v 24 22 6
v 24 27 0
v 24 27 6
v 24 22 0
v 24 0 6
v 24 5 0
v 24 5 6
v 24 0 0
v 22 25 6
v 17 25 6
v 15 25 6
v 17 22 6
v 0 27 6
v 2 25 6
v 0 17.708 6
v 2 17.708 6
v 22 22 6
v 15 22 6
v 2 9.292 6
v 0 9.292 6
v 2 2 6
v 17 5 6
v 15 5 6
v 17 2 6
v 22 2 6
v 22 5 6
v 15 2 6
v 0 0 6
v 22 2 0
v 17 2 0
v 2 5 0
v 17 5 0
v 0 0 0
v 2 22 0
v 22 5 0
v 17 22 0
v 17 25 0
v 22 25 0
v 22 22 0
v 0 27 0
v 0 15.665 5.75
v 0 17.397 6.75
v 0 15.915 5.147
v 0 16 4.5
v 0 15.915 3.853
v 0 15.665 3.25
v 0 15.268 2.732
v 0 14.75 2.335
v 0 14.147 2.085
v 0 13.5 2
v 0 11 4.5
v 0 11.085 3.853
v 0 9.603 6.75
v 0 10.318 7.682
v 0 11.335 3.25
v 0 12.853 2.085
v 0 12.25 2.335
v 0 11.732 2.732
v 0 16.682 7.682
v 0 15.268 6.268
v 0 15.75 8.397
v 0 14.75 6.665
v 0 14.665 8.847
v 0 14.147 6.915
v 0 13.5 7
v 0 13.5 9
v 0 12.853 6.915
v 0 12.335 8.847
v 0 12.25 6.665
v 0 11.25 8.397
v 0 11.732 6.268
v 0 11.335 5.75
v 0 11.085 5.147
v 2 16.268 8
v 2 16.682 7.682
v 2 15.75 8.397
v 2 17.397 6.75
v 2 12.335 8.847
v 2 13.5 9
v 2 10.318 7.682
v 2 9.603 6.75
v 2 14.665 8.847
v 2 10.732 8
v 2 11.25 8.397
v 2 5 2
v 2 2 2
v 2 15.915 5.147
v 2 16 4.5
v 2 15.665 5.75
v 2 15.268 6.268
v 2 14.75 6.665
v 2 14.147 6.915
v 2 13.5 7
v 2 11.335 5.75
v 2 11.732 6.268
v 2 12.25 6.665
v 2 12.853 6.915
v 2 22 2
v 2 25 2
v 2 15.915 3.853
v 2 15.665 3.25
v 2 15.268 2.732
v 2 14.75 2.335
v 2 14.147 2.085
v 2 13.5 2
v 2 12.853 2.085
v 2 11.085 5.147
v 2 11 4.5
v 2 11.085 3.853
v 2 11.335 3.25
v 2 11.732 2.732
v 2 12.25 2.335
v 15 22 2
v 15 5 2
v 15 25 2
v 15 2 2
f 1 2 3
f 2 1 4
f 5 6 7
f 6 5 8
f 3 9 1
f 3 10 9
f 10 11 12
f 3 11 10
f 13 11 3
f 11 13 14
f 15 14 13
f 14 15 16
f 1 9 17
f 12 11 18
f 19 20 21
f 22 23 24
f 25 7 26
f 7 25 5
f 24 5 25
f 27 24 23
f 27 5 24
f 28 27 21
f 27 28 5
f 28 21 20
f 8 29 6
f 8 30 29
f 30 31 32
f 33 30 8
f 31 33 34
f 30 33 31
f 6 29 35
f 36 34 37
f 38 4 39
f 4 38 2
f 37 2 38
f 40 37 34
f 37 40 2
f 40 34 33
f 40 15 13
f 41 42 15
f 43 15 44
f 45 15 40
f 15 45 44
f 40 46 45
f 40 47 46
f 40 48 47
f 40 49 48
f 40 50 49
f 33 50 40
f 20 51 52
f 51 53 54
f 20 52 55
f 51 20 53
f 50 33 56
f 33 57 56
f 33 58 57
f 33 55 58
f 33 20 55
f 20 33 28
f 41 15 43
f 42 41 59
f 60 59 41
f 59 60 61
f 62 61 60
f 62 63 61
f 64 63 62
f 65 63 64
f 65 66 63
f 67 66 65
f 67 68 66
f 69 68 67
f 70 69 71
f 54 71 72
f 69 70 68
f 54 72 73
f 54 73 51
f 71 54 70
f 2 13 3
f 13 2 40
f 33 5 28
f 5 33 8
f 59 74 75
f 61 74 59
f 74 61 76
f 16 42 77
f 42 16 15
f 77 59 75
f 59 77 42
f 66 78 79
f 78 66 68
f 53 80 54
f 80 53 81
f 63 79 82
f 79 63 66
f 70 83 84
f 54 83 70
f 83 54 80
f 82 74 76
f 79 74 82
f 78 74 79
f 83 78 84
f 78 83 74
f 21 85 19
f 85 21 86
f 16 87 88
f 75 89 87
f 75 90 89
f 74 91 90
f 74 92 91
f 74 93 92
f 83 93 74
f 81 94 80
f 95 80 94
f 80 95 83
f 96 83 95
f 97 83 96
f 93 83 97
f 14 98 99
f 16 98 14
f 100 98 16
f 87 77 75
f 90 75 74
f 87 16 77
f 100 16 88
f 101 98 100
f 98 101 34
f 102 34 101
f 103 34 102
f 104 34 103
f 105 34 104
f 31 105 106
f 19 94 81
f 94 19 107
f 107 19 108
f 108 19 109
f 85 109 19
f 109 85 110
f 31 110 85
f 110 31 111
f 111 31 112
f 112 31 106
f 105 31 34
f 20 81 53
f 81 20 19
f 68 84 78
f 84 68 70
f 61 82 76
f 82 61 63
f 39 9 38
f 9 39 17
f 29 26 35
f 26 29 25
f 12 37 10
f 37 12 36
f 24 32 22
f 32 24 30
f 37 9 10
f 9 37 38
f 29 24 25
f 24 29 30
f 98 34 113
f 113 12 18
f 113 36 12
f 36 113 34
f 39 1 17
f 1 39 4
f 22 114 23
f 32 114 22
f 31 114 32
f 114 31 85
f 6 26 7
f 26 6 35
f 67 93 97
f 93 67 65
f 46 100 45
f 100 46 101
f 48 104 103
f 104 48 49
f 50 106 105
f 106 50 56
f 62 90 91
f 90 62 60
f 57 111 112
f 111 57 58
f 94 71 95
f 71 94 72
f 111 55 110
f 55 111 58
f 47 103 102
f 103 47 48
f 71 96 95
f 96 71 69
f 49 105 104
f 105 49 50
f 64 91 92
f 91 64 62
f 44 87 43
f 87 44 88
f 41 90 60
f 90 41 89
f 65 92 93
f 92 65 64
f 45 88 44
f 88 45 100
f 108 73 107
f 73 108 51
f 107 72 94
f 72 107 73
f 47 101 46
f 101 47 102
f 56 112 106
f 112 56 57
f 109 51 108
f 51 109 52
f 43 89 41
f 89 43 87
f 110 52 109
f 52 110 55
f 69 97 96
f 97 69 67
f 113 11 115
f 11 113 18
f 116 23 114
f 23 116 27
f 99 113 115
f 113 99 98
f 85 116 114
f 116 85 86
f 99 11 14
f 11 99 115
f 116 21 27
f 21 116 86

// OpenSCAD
// author: clayb.rpi@gmail.com
// date: 2013-01-20
// units: mm
//
// description: A standoff bracket for mounting things to a ceiling.

// The width of the thing you are mounting.
THING_WIDTH = 23;

// The height of the thing you are mounting.
THING_HEIGHT = 5;

// The depth of the fingers grasping the thing you are mounting.
FINGER_DEPTH = 3;

// Distance from the wall the thing should be kept.
STANDOFF_HEIGHT = 15;

// How thick the walls of the bracket should be.
WALL_THICKNESS = 2;

// The printing height of the bracket.
BRACKET_HEIGHT = 6;

// The radius of the screw hole.
MOUNTING_SCREW_RADIUS = 2.5;


module ceilingMountingBracket($fn=24) {
  assign(outer_depth=2 * WALL_THICKNESS + THING_HEIGHT + max(0, STANDOFF_HEIGHT),
         outer_width=THING_WIDTH + 2 * WALL_THICKNESS,
         mounting_screw_height=max(BRACKET_HEIGHT / 2, WALL_THICKNESS + MOUNTING_SCREW_RADIUS)) {
    difference() {
      union() {
        // The rough shape of the bracket.
        cube([outer_depth, outer_width, BRACKET_HEIGHT]);

        // extra support for the mounting screw.
        translate([0, outer_width / 2, mounting_screw_height])
        rotate([0, 90, 0])
        cylinder(r=MOUNTING_SCREW_RADIUS + WALL_THICKNESS, h=WALL_THICKNESS);
      }

      // cut away the spot for the thing being mounted.
      translate([WALL_THICKNESS + max(0, STANDOFF_HEIGHT), WALL_THICKNESS, -1])
      cube([THING_HEIGHT, THING_WIDTH, BRACKET_HEIGHT + 2]);

      // cut away the core of the bracket.
      translate([WALL_THICKNESS, WALL_THICKNESS + FINGER_DEPTH, -1])
      cube([outer_depth, THING_WIDTH - 2 * FINGER_DEPTH, BRACKET_HEIGHT + 2]);

      // cut away the mounting screw hole.
      translate([-1, outer_width / 2, mounting_screw_height])
      rotate([0, 90, 0])
      cylinder(r=MOUNTING_SCREW_RADIUS, h=WALL_THICKNESS + 2);

      // cut away excess volume from the arms.
      translate([WALL_THICKNESS, WALL_THICKNESS, WALL_THICKNESS])
      cube([max(0, STANDOFF_HEIGHT - WALL_THICKNESS), THING_WIDTH, BRACKET_HEIGHT]);
    }
  }
}
ceilingMountingBracket();
